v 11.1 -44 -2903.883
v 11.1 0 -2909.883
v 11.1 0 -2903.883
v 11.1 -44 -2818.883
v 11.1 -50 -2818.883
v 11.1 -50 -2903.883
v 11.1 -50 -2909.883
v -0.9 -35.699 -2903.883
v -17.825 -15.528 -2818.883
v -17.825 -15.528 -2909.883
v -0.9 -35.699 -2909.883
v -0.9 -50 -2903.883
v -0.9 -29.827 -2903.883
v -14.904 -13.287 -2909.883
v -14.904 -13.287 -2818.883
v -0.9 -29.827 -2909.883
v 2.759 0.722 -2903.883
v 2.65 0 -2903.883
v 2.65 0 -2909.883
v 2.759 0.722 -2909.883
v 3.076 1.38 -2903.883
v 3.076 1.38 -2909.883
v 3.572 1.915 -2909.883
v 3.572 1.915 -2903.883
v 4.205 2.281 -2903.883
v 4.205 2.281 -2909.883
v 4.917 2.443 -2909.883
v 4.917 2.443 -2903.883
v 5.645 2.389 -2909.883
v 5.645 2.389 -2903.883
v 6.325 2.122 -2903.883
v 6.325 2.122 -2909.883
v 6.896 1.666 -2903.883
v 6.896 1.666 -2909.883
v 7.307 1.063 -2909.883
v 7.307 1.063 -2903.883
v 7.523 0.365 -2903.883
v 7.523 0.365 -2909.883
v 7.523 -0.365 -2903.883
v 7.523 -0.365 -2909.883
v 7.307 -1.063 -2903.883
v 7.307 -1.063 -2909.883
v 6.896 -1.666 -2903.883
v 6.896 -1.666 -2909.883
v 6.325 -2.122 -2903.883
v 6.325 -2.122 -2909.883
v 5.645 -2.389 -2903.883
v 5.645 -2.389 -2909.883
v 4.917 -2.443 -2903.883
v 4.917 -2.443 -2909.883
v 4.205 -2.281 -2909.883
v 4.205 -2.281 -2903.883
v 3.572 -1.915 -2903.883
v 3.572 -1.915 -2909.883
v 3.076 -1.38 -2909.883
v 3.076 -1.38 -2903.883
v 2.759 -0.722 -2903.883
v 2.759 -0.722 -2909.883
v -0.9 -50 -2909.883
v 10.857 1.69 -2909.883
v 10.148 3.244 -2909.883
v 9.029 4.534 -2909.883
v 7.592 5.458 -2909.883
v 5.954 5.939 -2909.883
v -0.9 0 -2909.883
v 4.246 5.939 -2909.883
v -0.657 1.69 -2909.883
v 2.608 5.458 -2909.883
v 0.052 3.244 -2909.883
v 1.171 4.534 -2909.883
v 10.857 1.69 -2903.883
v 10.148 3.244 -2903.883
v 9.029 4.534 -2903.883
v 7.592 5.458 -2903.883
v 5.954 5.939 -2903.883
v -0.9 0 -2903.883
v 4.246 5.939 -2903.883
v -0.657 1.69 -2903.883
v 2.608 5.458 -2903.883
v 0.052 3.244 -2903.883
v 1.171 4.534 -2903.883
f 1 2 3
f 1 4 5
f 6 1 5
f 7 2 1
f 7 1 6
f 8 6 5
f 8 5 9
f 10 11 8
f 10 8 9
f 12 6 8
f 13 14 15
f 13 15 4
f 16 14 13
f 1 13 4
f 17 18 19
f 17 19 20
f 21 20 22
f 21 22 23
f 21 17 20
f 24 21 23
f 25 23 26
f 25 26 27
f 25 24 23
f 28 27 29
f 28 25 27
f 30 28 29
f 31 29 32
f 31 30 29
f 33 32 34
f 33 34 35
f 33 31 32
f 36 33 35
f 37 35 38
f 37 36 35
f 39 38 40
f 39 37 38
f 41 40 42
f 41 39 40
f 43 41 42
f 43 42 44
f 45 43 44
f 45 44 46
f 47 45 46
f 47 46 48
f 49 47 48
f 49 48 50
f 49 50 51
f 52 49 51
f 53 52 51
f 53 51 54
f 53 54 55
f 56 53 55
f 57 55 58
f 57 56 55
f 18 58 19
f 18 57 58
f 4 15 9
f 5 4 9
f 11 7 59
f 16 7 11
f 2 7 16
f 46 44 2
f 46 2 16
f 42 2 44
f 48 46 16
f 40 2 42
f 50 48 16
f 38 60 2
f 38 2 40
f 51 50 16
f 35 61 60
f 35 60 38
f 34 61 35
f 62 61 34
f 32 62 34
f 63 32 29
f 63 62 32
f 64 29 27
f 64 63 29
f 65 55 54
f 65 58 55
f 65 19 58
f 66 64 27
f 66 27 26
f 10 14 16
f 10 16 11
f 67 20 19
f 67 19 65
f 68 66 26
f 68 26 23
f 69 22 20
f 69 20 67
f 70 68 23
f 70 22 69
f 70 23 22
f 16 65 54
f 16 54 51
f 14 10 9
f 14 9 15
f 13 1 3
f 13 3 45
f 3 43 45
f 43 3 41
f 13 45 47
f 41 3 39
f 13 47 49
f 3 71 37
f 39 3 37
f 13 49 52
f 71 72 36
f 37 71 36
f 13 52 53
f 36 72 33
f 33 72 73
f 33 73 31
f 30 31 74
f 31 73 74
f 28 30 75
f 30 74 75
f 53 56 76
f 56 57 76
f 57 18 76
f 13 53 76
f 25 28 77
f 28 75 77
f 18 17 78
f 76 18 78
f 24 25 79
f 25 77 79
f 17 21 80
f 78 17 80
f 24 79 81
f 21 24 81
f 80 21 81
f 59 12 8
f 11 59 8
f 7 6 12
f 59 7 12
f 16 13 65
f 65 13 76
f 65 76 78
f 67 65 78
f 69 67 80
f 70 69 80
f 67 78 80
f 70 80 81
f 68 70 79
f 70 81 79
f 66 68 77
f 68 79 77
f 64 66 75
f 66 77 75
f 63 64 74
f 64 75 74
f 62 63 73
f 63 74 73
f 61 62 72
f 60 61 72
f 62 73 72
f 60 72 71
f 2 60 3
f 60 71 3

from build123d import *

# Parameters (mm, degrees)
CROQUIS2_R              = 2.45
SALIENTE_EXTRUIR1_DEPTH = 6
SALIENTE_EXTRUIR2_DEPTH = 91
CORTAR_EXTRUIR1_DEPTH   = 91


with BuildPart() as part:
    # Croquis2 → Saliente-Extruir1 (new body)
    with BuildSketch(Plane(origin=(0, 0, -2903.883018812), x_dir=(-1, 0, 0), z_dir=(0, 0, -1))):
        with BuildLine():
            Line((-11.1, 0), (-11.1, -50))
            Line((-11.1, -50), (0.9, -50))
            Line((0.9, -50), (0.9, 0))
            ThreePointArc((0.9, 0), (-5.1, 6), (-11.1, 0))
        make_face()
        with Locations((-5.1, 0)):
            Circle(CROQUIS2_R, mode=Mode.SUBTRACT)
    extrude(amount=SALIENTE_EXTRUIR1_DEPTH)

    # Croquis3 → Saliente-Extruir2 (add)
    with BuildSketch(Plane(origin=(0, 0, -2909.883018812), x_dir=(-1, 0, 0), z_dir=(0, 0, -1))):
        Polygon((-11.1, -50), (17.825442436, -15.52800006), (14.903598687, -13.287396749), (-11.1, -44), align=None)
    extrude(amount=-SALIENTE_EXTRUIR2_DEPTH)

    # Croquis4 → Cortar-Extruir1 (cut)
    with BuildSketch(Plane(origin=(0, 0, -2909.883018812), x_dir=(-1, 0, 0), z_dir=(0, 0, -1))):
        Polygon((0.9, -35.698956889), (-11.1, -50), (-9.748210825, -87.200753785), (4.844427823, -87.200753785), (-12.615201312, -51.805746607), align=None)
    extrude(amount=-CORTAR_EXTRUIR1_DEPTH, mode=Mode.SUBTRACT)


solid = part.part
